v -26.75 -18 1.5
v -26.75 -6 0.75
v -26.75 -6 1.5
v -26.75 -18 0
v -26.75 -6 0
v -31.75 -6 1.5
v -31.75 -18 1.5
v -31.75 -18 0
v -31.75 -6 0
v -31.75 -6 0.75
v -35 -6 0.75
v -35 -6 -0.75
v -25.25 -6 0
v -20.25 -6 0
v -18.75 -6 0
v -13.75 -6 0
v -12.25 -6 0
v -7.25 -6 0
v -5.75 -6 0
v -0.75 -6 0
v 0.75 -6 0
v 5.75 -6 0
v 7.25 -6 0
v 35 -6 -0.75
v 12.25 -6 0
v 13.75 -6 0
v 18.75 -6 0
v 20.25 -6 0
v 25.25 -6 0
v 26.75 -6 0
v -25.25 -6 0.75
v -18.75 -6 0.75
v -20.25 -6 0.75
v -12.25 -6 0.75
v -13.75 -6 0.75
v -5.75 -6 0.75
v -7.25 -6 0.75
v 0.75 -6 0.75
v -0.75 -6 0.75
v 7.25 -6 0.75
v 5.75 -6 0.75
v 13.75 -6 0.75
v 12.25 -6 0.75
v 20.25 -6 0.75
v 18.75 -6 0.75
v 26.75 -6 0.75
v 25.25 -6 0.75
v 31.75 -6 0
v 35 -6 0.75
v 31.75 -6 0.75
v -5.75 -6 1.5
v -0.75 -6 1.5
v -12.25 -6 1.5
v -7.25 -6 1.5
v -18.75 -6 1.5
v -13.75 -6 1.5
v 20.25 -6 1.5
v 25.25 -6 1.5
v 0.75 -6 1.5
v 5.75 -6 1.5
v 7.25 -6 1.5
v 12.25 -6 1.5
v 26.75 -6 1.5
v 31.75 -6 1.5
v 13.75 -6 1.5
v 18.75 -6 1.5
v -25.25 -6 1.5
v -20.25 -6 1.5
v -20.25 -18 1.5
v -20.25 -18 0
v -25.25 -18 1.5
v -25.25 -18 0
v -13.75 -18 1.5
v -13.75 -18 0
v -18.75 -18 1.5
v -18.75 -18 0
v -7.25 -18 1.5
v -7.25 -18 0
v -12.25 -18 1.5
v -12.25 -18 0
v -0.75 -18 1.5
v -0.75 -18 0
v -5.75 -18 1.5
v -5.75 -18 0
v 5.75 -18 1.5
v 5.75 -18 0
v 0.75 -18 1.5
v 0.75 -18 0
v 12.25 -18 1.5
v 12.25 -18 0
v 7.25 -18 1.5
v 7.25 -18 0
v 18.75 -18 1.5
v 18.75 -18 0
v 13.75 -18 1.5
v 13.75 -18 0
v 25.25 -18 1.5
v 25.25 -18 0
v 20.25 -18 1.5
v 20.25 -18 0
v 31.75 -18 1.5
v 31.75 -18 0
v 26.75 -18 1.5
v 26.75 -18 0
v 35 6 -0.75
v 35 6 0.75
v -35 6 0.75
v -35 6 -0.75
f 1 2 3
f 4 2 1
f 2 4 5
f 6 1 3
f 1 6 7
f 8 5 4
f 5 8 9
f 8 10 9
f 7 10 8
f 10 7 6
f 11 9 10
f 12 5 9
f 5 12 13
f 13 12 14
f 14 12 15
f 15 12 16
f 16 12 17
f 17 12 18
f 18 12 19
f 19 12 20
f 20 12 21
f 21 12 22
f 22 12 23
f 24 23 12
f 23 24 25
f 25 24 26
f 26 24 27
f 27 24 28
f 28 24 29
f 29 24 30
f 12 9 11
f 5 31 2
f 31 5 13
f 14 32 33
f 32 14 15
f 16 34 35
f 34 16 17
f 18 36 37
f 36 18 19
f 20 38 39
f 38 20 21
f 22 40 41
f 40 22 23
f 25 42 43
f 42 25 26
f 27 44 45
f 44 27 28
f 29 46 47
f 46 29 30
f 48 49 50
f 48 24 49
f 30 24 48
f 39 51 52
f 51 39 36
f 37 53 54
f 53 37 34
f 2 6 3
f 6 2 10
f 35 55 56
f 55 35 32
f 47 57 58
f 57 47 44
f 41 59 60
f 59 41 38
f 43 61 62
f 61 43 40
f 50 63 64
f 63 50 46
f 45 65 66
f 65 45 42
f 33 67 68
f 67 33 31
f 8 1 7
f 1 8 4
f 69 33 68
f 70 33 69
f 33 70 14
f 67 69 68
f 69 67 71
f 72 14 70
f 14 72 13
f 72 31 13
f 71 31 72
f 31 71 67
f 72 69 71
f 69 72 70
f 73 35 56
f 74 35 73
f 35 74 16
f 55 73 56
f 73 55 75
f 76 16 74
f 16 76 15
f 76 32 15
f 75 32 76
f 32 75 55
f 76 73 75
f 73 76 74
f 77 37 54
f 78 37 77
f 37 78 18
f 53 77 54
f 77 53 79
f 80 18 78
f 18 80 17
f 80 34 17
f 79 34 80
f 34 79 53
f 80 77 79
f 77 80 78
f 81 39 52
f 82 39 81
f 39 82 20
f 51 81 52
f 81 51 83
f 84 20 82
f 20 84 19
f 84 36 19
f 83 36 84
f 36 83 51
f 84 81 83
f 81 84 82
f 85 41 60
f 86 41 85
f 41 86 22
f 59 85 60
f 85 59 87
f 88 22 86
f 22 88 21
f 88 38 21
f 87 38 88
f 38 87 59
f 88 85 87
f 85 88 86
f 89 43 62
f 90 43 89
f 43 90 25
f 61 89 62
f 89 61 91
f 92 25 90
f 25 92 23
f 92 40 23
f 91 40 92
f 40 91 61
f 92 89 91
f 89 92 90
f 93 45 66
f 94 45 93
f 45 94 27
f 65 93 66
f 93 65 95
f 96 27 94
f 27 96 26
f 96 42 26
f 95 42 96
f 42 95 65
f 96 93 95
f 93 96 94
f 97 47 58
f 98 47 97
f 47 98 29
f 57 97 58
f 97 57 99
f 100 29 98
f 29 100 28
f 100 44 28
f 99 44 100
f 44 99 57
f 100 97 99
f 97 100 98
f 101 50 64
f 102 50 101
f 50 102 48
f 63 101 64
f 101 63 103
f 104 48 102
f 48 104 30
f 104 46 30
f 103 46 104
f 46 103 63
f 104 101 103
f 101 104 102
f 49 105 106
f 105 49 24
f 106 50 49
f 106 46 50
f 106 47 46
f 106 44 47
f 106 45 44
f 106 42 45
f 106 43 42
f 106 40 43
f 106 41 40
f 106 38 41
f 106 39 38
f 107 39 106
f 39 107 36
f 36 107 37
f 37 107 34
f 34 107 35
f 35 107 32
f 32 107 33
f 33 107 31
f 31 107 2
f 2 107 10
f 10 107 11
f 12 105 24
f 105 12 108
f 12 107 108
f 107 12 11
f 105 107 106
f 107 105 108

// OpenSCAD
// 10-well comb for agarose gel casting
// Print orientation: flat on XY plane, Z = 0

$fn = 64;

// Dimensions
thickness = 1.5;        // Z thickness (mm)
spine_length = 70;      // X length of spine (mm)
spine_width = 12;       // Y width of spine (mm)
tooth_width = 5.0;      // X width of each tooth (mm)
tooth_length = 12;      // Y length of each tooth (mm)
gap_width = 1.5;        // X gap between neighbouring teeth (mm)
num_teeth = 10;         // number of teeth

// Calculate total width of teeth + gaps
total_tooth_width = num_teeth * tooth_width;
total_gap_width = (num_teeth - 1) * gap_width;
teeth_row_width = total_tooth_width + total_gap_width;

// Center the comb on the origin in X and Y
// Spine is centered on X, extends from -spine_length/2 to +spine_length/2 in X
// and from 0 to spine_width in Y (teeth hang in -Y direction)

// Build the comb
difference() {
    // Base plate (spine + teeth)
    union() {
        // Spine (back bar)
        cube([spine_length, spine_width, thickness], center = true);
        
        // Teeth
        for (i = [0 : num_teeth - 1]) {
            // Calculate X position of each tooth
            // Teeth are centered on the spine, so first tooth starts at:
            // -teeth_row_width/2 + tooth_width/2
            x_pos = -teeth_row_width/2 + i * (tooth_width + gap_width) + tooth_width/2;
            
            // Position tooth: centered in X, extending from spine edge (-Y direction)
            // Spine edge is at Y = -spine_width/2 (since spine is centered at Y=0)
            translate([x_pos, -spine_width/2 - tooth_length/2, thickness/2])
                cube([tooth_width, tooth_length, thickness], center = true);
        }
    }
    
    // No need for holes or cuts; comb is solid except for gaps between teeth
    // Gaps are created naturally by spacing the teeth with gap_width
}
